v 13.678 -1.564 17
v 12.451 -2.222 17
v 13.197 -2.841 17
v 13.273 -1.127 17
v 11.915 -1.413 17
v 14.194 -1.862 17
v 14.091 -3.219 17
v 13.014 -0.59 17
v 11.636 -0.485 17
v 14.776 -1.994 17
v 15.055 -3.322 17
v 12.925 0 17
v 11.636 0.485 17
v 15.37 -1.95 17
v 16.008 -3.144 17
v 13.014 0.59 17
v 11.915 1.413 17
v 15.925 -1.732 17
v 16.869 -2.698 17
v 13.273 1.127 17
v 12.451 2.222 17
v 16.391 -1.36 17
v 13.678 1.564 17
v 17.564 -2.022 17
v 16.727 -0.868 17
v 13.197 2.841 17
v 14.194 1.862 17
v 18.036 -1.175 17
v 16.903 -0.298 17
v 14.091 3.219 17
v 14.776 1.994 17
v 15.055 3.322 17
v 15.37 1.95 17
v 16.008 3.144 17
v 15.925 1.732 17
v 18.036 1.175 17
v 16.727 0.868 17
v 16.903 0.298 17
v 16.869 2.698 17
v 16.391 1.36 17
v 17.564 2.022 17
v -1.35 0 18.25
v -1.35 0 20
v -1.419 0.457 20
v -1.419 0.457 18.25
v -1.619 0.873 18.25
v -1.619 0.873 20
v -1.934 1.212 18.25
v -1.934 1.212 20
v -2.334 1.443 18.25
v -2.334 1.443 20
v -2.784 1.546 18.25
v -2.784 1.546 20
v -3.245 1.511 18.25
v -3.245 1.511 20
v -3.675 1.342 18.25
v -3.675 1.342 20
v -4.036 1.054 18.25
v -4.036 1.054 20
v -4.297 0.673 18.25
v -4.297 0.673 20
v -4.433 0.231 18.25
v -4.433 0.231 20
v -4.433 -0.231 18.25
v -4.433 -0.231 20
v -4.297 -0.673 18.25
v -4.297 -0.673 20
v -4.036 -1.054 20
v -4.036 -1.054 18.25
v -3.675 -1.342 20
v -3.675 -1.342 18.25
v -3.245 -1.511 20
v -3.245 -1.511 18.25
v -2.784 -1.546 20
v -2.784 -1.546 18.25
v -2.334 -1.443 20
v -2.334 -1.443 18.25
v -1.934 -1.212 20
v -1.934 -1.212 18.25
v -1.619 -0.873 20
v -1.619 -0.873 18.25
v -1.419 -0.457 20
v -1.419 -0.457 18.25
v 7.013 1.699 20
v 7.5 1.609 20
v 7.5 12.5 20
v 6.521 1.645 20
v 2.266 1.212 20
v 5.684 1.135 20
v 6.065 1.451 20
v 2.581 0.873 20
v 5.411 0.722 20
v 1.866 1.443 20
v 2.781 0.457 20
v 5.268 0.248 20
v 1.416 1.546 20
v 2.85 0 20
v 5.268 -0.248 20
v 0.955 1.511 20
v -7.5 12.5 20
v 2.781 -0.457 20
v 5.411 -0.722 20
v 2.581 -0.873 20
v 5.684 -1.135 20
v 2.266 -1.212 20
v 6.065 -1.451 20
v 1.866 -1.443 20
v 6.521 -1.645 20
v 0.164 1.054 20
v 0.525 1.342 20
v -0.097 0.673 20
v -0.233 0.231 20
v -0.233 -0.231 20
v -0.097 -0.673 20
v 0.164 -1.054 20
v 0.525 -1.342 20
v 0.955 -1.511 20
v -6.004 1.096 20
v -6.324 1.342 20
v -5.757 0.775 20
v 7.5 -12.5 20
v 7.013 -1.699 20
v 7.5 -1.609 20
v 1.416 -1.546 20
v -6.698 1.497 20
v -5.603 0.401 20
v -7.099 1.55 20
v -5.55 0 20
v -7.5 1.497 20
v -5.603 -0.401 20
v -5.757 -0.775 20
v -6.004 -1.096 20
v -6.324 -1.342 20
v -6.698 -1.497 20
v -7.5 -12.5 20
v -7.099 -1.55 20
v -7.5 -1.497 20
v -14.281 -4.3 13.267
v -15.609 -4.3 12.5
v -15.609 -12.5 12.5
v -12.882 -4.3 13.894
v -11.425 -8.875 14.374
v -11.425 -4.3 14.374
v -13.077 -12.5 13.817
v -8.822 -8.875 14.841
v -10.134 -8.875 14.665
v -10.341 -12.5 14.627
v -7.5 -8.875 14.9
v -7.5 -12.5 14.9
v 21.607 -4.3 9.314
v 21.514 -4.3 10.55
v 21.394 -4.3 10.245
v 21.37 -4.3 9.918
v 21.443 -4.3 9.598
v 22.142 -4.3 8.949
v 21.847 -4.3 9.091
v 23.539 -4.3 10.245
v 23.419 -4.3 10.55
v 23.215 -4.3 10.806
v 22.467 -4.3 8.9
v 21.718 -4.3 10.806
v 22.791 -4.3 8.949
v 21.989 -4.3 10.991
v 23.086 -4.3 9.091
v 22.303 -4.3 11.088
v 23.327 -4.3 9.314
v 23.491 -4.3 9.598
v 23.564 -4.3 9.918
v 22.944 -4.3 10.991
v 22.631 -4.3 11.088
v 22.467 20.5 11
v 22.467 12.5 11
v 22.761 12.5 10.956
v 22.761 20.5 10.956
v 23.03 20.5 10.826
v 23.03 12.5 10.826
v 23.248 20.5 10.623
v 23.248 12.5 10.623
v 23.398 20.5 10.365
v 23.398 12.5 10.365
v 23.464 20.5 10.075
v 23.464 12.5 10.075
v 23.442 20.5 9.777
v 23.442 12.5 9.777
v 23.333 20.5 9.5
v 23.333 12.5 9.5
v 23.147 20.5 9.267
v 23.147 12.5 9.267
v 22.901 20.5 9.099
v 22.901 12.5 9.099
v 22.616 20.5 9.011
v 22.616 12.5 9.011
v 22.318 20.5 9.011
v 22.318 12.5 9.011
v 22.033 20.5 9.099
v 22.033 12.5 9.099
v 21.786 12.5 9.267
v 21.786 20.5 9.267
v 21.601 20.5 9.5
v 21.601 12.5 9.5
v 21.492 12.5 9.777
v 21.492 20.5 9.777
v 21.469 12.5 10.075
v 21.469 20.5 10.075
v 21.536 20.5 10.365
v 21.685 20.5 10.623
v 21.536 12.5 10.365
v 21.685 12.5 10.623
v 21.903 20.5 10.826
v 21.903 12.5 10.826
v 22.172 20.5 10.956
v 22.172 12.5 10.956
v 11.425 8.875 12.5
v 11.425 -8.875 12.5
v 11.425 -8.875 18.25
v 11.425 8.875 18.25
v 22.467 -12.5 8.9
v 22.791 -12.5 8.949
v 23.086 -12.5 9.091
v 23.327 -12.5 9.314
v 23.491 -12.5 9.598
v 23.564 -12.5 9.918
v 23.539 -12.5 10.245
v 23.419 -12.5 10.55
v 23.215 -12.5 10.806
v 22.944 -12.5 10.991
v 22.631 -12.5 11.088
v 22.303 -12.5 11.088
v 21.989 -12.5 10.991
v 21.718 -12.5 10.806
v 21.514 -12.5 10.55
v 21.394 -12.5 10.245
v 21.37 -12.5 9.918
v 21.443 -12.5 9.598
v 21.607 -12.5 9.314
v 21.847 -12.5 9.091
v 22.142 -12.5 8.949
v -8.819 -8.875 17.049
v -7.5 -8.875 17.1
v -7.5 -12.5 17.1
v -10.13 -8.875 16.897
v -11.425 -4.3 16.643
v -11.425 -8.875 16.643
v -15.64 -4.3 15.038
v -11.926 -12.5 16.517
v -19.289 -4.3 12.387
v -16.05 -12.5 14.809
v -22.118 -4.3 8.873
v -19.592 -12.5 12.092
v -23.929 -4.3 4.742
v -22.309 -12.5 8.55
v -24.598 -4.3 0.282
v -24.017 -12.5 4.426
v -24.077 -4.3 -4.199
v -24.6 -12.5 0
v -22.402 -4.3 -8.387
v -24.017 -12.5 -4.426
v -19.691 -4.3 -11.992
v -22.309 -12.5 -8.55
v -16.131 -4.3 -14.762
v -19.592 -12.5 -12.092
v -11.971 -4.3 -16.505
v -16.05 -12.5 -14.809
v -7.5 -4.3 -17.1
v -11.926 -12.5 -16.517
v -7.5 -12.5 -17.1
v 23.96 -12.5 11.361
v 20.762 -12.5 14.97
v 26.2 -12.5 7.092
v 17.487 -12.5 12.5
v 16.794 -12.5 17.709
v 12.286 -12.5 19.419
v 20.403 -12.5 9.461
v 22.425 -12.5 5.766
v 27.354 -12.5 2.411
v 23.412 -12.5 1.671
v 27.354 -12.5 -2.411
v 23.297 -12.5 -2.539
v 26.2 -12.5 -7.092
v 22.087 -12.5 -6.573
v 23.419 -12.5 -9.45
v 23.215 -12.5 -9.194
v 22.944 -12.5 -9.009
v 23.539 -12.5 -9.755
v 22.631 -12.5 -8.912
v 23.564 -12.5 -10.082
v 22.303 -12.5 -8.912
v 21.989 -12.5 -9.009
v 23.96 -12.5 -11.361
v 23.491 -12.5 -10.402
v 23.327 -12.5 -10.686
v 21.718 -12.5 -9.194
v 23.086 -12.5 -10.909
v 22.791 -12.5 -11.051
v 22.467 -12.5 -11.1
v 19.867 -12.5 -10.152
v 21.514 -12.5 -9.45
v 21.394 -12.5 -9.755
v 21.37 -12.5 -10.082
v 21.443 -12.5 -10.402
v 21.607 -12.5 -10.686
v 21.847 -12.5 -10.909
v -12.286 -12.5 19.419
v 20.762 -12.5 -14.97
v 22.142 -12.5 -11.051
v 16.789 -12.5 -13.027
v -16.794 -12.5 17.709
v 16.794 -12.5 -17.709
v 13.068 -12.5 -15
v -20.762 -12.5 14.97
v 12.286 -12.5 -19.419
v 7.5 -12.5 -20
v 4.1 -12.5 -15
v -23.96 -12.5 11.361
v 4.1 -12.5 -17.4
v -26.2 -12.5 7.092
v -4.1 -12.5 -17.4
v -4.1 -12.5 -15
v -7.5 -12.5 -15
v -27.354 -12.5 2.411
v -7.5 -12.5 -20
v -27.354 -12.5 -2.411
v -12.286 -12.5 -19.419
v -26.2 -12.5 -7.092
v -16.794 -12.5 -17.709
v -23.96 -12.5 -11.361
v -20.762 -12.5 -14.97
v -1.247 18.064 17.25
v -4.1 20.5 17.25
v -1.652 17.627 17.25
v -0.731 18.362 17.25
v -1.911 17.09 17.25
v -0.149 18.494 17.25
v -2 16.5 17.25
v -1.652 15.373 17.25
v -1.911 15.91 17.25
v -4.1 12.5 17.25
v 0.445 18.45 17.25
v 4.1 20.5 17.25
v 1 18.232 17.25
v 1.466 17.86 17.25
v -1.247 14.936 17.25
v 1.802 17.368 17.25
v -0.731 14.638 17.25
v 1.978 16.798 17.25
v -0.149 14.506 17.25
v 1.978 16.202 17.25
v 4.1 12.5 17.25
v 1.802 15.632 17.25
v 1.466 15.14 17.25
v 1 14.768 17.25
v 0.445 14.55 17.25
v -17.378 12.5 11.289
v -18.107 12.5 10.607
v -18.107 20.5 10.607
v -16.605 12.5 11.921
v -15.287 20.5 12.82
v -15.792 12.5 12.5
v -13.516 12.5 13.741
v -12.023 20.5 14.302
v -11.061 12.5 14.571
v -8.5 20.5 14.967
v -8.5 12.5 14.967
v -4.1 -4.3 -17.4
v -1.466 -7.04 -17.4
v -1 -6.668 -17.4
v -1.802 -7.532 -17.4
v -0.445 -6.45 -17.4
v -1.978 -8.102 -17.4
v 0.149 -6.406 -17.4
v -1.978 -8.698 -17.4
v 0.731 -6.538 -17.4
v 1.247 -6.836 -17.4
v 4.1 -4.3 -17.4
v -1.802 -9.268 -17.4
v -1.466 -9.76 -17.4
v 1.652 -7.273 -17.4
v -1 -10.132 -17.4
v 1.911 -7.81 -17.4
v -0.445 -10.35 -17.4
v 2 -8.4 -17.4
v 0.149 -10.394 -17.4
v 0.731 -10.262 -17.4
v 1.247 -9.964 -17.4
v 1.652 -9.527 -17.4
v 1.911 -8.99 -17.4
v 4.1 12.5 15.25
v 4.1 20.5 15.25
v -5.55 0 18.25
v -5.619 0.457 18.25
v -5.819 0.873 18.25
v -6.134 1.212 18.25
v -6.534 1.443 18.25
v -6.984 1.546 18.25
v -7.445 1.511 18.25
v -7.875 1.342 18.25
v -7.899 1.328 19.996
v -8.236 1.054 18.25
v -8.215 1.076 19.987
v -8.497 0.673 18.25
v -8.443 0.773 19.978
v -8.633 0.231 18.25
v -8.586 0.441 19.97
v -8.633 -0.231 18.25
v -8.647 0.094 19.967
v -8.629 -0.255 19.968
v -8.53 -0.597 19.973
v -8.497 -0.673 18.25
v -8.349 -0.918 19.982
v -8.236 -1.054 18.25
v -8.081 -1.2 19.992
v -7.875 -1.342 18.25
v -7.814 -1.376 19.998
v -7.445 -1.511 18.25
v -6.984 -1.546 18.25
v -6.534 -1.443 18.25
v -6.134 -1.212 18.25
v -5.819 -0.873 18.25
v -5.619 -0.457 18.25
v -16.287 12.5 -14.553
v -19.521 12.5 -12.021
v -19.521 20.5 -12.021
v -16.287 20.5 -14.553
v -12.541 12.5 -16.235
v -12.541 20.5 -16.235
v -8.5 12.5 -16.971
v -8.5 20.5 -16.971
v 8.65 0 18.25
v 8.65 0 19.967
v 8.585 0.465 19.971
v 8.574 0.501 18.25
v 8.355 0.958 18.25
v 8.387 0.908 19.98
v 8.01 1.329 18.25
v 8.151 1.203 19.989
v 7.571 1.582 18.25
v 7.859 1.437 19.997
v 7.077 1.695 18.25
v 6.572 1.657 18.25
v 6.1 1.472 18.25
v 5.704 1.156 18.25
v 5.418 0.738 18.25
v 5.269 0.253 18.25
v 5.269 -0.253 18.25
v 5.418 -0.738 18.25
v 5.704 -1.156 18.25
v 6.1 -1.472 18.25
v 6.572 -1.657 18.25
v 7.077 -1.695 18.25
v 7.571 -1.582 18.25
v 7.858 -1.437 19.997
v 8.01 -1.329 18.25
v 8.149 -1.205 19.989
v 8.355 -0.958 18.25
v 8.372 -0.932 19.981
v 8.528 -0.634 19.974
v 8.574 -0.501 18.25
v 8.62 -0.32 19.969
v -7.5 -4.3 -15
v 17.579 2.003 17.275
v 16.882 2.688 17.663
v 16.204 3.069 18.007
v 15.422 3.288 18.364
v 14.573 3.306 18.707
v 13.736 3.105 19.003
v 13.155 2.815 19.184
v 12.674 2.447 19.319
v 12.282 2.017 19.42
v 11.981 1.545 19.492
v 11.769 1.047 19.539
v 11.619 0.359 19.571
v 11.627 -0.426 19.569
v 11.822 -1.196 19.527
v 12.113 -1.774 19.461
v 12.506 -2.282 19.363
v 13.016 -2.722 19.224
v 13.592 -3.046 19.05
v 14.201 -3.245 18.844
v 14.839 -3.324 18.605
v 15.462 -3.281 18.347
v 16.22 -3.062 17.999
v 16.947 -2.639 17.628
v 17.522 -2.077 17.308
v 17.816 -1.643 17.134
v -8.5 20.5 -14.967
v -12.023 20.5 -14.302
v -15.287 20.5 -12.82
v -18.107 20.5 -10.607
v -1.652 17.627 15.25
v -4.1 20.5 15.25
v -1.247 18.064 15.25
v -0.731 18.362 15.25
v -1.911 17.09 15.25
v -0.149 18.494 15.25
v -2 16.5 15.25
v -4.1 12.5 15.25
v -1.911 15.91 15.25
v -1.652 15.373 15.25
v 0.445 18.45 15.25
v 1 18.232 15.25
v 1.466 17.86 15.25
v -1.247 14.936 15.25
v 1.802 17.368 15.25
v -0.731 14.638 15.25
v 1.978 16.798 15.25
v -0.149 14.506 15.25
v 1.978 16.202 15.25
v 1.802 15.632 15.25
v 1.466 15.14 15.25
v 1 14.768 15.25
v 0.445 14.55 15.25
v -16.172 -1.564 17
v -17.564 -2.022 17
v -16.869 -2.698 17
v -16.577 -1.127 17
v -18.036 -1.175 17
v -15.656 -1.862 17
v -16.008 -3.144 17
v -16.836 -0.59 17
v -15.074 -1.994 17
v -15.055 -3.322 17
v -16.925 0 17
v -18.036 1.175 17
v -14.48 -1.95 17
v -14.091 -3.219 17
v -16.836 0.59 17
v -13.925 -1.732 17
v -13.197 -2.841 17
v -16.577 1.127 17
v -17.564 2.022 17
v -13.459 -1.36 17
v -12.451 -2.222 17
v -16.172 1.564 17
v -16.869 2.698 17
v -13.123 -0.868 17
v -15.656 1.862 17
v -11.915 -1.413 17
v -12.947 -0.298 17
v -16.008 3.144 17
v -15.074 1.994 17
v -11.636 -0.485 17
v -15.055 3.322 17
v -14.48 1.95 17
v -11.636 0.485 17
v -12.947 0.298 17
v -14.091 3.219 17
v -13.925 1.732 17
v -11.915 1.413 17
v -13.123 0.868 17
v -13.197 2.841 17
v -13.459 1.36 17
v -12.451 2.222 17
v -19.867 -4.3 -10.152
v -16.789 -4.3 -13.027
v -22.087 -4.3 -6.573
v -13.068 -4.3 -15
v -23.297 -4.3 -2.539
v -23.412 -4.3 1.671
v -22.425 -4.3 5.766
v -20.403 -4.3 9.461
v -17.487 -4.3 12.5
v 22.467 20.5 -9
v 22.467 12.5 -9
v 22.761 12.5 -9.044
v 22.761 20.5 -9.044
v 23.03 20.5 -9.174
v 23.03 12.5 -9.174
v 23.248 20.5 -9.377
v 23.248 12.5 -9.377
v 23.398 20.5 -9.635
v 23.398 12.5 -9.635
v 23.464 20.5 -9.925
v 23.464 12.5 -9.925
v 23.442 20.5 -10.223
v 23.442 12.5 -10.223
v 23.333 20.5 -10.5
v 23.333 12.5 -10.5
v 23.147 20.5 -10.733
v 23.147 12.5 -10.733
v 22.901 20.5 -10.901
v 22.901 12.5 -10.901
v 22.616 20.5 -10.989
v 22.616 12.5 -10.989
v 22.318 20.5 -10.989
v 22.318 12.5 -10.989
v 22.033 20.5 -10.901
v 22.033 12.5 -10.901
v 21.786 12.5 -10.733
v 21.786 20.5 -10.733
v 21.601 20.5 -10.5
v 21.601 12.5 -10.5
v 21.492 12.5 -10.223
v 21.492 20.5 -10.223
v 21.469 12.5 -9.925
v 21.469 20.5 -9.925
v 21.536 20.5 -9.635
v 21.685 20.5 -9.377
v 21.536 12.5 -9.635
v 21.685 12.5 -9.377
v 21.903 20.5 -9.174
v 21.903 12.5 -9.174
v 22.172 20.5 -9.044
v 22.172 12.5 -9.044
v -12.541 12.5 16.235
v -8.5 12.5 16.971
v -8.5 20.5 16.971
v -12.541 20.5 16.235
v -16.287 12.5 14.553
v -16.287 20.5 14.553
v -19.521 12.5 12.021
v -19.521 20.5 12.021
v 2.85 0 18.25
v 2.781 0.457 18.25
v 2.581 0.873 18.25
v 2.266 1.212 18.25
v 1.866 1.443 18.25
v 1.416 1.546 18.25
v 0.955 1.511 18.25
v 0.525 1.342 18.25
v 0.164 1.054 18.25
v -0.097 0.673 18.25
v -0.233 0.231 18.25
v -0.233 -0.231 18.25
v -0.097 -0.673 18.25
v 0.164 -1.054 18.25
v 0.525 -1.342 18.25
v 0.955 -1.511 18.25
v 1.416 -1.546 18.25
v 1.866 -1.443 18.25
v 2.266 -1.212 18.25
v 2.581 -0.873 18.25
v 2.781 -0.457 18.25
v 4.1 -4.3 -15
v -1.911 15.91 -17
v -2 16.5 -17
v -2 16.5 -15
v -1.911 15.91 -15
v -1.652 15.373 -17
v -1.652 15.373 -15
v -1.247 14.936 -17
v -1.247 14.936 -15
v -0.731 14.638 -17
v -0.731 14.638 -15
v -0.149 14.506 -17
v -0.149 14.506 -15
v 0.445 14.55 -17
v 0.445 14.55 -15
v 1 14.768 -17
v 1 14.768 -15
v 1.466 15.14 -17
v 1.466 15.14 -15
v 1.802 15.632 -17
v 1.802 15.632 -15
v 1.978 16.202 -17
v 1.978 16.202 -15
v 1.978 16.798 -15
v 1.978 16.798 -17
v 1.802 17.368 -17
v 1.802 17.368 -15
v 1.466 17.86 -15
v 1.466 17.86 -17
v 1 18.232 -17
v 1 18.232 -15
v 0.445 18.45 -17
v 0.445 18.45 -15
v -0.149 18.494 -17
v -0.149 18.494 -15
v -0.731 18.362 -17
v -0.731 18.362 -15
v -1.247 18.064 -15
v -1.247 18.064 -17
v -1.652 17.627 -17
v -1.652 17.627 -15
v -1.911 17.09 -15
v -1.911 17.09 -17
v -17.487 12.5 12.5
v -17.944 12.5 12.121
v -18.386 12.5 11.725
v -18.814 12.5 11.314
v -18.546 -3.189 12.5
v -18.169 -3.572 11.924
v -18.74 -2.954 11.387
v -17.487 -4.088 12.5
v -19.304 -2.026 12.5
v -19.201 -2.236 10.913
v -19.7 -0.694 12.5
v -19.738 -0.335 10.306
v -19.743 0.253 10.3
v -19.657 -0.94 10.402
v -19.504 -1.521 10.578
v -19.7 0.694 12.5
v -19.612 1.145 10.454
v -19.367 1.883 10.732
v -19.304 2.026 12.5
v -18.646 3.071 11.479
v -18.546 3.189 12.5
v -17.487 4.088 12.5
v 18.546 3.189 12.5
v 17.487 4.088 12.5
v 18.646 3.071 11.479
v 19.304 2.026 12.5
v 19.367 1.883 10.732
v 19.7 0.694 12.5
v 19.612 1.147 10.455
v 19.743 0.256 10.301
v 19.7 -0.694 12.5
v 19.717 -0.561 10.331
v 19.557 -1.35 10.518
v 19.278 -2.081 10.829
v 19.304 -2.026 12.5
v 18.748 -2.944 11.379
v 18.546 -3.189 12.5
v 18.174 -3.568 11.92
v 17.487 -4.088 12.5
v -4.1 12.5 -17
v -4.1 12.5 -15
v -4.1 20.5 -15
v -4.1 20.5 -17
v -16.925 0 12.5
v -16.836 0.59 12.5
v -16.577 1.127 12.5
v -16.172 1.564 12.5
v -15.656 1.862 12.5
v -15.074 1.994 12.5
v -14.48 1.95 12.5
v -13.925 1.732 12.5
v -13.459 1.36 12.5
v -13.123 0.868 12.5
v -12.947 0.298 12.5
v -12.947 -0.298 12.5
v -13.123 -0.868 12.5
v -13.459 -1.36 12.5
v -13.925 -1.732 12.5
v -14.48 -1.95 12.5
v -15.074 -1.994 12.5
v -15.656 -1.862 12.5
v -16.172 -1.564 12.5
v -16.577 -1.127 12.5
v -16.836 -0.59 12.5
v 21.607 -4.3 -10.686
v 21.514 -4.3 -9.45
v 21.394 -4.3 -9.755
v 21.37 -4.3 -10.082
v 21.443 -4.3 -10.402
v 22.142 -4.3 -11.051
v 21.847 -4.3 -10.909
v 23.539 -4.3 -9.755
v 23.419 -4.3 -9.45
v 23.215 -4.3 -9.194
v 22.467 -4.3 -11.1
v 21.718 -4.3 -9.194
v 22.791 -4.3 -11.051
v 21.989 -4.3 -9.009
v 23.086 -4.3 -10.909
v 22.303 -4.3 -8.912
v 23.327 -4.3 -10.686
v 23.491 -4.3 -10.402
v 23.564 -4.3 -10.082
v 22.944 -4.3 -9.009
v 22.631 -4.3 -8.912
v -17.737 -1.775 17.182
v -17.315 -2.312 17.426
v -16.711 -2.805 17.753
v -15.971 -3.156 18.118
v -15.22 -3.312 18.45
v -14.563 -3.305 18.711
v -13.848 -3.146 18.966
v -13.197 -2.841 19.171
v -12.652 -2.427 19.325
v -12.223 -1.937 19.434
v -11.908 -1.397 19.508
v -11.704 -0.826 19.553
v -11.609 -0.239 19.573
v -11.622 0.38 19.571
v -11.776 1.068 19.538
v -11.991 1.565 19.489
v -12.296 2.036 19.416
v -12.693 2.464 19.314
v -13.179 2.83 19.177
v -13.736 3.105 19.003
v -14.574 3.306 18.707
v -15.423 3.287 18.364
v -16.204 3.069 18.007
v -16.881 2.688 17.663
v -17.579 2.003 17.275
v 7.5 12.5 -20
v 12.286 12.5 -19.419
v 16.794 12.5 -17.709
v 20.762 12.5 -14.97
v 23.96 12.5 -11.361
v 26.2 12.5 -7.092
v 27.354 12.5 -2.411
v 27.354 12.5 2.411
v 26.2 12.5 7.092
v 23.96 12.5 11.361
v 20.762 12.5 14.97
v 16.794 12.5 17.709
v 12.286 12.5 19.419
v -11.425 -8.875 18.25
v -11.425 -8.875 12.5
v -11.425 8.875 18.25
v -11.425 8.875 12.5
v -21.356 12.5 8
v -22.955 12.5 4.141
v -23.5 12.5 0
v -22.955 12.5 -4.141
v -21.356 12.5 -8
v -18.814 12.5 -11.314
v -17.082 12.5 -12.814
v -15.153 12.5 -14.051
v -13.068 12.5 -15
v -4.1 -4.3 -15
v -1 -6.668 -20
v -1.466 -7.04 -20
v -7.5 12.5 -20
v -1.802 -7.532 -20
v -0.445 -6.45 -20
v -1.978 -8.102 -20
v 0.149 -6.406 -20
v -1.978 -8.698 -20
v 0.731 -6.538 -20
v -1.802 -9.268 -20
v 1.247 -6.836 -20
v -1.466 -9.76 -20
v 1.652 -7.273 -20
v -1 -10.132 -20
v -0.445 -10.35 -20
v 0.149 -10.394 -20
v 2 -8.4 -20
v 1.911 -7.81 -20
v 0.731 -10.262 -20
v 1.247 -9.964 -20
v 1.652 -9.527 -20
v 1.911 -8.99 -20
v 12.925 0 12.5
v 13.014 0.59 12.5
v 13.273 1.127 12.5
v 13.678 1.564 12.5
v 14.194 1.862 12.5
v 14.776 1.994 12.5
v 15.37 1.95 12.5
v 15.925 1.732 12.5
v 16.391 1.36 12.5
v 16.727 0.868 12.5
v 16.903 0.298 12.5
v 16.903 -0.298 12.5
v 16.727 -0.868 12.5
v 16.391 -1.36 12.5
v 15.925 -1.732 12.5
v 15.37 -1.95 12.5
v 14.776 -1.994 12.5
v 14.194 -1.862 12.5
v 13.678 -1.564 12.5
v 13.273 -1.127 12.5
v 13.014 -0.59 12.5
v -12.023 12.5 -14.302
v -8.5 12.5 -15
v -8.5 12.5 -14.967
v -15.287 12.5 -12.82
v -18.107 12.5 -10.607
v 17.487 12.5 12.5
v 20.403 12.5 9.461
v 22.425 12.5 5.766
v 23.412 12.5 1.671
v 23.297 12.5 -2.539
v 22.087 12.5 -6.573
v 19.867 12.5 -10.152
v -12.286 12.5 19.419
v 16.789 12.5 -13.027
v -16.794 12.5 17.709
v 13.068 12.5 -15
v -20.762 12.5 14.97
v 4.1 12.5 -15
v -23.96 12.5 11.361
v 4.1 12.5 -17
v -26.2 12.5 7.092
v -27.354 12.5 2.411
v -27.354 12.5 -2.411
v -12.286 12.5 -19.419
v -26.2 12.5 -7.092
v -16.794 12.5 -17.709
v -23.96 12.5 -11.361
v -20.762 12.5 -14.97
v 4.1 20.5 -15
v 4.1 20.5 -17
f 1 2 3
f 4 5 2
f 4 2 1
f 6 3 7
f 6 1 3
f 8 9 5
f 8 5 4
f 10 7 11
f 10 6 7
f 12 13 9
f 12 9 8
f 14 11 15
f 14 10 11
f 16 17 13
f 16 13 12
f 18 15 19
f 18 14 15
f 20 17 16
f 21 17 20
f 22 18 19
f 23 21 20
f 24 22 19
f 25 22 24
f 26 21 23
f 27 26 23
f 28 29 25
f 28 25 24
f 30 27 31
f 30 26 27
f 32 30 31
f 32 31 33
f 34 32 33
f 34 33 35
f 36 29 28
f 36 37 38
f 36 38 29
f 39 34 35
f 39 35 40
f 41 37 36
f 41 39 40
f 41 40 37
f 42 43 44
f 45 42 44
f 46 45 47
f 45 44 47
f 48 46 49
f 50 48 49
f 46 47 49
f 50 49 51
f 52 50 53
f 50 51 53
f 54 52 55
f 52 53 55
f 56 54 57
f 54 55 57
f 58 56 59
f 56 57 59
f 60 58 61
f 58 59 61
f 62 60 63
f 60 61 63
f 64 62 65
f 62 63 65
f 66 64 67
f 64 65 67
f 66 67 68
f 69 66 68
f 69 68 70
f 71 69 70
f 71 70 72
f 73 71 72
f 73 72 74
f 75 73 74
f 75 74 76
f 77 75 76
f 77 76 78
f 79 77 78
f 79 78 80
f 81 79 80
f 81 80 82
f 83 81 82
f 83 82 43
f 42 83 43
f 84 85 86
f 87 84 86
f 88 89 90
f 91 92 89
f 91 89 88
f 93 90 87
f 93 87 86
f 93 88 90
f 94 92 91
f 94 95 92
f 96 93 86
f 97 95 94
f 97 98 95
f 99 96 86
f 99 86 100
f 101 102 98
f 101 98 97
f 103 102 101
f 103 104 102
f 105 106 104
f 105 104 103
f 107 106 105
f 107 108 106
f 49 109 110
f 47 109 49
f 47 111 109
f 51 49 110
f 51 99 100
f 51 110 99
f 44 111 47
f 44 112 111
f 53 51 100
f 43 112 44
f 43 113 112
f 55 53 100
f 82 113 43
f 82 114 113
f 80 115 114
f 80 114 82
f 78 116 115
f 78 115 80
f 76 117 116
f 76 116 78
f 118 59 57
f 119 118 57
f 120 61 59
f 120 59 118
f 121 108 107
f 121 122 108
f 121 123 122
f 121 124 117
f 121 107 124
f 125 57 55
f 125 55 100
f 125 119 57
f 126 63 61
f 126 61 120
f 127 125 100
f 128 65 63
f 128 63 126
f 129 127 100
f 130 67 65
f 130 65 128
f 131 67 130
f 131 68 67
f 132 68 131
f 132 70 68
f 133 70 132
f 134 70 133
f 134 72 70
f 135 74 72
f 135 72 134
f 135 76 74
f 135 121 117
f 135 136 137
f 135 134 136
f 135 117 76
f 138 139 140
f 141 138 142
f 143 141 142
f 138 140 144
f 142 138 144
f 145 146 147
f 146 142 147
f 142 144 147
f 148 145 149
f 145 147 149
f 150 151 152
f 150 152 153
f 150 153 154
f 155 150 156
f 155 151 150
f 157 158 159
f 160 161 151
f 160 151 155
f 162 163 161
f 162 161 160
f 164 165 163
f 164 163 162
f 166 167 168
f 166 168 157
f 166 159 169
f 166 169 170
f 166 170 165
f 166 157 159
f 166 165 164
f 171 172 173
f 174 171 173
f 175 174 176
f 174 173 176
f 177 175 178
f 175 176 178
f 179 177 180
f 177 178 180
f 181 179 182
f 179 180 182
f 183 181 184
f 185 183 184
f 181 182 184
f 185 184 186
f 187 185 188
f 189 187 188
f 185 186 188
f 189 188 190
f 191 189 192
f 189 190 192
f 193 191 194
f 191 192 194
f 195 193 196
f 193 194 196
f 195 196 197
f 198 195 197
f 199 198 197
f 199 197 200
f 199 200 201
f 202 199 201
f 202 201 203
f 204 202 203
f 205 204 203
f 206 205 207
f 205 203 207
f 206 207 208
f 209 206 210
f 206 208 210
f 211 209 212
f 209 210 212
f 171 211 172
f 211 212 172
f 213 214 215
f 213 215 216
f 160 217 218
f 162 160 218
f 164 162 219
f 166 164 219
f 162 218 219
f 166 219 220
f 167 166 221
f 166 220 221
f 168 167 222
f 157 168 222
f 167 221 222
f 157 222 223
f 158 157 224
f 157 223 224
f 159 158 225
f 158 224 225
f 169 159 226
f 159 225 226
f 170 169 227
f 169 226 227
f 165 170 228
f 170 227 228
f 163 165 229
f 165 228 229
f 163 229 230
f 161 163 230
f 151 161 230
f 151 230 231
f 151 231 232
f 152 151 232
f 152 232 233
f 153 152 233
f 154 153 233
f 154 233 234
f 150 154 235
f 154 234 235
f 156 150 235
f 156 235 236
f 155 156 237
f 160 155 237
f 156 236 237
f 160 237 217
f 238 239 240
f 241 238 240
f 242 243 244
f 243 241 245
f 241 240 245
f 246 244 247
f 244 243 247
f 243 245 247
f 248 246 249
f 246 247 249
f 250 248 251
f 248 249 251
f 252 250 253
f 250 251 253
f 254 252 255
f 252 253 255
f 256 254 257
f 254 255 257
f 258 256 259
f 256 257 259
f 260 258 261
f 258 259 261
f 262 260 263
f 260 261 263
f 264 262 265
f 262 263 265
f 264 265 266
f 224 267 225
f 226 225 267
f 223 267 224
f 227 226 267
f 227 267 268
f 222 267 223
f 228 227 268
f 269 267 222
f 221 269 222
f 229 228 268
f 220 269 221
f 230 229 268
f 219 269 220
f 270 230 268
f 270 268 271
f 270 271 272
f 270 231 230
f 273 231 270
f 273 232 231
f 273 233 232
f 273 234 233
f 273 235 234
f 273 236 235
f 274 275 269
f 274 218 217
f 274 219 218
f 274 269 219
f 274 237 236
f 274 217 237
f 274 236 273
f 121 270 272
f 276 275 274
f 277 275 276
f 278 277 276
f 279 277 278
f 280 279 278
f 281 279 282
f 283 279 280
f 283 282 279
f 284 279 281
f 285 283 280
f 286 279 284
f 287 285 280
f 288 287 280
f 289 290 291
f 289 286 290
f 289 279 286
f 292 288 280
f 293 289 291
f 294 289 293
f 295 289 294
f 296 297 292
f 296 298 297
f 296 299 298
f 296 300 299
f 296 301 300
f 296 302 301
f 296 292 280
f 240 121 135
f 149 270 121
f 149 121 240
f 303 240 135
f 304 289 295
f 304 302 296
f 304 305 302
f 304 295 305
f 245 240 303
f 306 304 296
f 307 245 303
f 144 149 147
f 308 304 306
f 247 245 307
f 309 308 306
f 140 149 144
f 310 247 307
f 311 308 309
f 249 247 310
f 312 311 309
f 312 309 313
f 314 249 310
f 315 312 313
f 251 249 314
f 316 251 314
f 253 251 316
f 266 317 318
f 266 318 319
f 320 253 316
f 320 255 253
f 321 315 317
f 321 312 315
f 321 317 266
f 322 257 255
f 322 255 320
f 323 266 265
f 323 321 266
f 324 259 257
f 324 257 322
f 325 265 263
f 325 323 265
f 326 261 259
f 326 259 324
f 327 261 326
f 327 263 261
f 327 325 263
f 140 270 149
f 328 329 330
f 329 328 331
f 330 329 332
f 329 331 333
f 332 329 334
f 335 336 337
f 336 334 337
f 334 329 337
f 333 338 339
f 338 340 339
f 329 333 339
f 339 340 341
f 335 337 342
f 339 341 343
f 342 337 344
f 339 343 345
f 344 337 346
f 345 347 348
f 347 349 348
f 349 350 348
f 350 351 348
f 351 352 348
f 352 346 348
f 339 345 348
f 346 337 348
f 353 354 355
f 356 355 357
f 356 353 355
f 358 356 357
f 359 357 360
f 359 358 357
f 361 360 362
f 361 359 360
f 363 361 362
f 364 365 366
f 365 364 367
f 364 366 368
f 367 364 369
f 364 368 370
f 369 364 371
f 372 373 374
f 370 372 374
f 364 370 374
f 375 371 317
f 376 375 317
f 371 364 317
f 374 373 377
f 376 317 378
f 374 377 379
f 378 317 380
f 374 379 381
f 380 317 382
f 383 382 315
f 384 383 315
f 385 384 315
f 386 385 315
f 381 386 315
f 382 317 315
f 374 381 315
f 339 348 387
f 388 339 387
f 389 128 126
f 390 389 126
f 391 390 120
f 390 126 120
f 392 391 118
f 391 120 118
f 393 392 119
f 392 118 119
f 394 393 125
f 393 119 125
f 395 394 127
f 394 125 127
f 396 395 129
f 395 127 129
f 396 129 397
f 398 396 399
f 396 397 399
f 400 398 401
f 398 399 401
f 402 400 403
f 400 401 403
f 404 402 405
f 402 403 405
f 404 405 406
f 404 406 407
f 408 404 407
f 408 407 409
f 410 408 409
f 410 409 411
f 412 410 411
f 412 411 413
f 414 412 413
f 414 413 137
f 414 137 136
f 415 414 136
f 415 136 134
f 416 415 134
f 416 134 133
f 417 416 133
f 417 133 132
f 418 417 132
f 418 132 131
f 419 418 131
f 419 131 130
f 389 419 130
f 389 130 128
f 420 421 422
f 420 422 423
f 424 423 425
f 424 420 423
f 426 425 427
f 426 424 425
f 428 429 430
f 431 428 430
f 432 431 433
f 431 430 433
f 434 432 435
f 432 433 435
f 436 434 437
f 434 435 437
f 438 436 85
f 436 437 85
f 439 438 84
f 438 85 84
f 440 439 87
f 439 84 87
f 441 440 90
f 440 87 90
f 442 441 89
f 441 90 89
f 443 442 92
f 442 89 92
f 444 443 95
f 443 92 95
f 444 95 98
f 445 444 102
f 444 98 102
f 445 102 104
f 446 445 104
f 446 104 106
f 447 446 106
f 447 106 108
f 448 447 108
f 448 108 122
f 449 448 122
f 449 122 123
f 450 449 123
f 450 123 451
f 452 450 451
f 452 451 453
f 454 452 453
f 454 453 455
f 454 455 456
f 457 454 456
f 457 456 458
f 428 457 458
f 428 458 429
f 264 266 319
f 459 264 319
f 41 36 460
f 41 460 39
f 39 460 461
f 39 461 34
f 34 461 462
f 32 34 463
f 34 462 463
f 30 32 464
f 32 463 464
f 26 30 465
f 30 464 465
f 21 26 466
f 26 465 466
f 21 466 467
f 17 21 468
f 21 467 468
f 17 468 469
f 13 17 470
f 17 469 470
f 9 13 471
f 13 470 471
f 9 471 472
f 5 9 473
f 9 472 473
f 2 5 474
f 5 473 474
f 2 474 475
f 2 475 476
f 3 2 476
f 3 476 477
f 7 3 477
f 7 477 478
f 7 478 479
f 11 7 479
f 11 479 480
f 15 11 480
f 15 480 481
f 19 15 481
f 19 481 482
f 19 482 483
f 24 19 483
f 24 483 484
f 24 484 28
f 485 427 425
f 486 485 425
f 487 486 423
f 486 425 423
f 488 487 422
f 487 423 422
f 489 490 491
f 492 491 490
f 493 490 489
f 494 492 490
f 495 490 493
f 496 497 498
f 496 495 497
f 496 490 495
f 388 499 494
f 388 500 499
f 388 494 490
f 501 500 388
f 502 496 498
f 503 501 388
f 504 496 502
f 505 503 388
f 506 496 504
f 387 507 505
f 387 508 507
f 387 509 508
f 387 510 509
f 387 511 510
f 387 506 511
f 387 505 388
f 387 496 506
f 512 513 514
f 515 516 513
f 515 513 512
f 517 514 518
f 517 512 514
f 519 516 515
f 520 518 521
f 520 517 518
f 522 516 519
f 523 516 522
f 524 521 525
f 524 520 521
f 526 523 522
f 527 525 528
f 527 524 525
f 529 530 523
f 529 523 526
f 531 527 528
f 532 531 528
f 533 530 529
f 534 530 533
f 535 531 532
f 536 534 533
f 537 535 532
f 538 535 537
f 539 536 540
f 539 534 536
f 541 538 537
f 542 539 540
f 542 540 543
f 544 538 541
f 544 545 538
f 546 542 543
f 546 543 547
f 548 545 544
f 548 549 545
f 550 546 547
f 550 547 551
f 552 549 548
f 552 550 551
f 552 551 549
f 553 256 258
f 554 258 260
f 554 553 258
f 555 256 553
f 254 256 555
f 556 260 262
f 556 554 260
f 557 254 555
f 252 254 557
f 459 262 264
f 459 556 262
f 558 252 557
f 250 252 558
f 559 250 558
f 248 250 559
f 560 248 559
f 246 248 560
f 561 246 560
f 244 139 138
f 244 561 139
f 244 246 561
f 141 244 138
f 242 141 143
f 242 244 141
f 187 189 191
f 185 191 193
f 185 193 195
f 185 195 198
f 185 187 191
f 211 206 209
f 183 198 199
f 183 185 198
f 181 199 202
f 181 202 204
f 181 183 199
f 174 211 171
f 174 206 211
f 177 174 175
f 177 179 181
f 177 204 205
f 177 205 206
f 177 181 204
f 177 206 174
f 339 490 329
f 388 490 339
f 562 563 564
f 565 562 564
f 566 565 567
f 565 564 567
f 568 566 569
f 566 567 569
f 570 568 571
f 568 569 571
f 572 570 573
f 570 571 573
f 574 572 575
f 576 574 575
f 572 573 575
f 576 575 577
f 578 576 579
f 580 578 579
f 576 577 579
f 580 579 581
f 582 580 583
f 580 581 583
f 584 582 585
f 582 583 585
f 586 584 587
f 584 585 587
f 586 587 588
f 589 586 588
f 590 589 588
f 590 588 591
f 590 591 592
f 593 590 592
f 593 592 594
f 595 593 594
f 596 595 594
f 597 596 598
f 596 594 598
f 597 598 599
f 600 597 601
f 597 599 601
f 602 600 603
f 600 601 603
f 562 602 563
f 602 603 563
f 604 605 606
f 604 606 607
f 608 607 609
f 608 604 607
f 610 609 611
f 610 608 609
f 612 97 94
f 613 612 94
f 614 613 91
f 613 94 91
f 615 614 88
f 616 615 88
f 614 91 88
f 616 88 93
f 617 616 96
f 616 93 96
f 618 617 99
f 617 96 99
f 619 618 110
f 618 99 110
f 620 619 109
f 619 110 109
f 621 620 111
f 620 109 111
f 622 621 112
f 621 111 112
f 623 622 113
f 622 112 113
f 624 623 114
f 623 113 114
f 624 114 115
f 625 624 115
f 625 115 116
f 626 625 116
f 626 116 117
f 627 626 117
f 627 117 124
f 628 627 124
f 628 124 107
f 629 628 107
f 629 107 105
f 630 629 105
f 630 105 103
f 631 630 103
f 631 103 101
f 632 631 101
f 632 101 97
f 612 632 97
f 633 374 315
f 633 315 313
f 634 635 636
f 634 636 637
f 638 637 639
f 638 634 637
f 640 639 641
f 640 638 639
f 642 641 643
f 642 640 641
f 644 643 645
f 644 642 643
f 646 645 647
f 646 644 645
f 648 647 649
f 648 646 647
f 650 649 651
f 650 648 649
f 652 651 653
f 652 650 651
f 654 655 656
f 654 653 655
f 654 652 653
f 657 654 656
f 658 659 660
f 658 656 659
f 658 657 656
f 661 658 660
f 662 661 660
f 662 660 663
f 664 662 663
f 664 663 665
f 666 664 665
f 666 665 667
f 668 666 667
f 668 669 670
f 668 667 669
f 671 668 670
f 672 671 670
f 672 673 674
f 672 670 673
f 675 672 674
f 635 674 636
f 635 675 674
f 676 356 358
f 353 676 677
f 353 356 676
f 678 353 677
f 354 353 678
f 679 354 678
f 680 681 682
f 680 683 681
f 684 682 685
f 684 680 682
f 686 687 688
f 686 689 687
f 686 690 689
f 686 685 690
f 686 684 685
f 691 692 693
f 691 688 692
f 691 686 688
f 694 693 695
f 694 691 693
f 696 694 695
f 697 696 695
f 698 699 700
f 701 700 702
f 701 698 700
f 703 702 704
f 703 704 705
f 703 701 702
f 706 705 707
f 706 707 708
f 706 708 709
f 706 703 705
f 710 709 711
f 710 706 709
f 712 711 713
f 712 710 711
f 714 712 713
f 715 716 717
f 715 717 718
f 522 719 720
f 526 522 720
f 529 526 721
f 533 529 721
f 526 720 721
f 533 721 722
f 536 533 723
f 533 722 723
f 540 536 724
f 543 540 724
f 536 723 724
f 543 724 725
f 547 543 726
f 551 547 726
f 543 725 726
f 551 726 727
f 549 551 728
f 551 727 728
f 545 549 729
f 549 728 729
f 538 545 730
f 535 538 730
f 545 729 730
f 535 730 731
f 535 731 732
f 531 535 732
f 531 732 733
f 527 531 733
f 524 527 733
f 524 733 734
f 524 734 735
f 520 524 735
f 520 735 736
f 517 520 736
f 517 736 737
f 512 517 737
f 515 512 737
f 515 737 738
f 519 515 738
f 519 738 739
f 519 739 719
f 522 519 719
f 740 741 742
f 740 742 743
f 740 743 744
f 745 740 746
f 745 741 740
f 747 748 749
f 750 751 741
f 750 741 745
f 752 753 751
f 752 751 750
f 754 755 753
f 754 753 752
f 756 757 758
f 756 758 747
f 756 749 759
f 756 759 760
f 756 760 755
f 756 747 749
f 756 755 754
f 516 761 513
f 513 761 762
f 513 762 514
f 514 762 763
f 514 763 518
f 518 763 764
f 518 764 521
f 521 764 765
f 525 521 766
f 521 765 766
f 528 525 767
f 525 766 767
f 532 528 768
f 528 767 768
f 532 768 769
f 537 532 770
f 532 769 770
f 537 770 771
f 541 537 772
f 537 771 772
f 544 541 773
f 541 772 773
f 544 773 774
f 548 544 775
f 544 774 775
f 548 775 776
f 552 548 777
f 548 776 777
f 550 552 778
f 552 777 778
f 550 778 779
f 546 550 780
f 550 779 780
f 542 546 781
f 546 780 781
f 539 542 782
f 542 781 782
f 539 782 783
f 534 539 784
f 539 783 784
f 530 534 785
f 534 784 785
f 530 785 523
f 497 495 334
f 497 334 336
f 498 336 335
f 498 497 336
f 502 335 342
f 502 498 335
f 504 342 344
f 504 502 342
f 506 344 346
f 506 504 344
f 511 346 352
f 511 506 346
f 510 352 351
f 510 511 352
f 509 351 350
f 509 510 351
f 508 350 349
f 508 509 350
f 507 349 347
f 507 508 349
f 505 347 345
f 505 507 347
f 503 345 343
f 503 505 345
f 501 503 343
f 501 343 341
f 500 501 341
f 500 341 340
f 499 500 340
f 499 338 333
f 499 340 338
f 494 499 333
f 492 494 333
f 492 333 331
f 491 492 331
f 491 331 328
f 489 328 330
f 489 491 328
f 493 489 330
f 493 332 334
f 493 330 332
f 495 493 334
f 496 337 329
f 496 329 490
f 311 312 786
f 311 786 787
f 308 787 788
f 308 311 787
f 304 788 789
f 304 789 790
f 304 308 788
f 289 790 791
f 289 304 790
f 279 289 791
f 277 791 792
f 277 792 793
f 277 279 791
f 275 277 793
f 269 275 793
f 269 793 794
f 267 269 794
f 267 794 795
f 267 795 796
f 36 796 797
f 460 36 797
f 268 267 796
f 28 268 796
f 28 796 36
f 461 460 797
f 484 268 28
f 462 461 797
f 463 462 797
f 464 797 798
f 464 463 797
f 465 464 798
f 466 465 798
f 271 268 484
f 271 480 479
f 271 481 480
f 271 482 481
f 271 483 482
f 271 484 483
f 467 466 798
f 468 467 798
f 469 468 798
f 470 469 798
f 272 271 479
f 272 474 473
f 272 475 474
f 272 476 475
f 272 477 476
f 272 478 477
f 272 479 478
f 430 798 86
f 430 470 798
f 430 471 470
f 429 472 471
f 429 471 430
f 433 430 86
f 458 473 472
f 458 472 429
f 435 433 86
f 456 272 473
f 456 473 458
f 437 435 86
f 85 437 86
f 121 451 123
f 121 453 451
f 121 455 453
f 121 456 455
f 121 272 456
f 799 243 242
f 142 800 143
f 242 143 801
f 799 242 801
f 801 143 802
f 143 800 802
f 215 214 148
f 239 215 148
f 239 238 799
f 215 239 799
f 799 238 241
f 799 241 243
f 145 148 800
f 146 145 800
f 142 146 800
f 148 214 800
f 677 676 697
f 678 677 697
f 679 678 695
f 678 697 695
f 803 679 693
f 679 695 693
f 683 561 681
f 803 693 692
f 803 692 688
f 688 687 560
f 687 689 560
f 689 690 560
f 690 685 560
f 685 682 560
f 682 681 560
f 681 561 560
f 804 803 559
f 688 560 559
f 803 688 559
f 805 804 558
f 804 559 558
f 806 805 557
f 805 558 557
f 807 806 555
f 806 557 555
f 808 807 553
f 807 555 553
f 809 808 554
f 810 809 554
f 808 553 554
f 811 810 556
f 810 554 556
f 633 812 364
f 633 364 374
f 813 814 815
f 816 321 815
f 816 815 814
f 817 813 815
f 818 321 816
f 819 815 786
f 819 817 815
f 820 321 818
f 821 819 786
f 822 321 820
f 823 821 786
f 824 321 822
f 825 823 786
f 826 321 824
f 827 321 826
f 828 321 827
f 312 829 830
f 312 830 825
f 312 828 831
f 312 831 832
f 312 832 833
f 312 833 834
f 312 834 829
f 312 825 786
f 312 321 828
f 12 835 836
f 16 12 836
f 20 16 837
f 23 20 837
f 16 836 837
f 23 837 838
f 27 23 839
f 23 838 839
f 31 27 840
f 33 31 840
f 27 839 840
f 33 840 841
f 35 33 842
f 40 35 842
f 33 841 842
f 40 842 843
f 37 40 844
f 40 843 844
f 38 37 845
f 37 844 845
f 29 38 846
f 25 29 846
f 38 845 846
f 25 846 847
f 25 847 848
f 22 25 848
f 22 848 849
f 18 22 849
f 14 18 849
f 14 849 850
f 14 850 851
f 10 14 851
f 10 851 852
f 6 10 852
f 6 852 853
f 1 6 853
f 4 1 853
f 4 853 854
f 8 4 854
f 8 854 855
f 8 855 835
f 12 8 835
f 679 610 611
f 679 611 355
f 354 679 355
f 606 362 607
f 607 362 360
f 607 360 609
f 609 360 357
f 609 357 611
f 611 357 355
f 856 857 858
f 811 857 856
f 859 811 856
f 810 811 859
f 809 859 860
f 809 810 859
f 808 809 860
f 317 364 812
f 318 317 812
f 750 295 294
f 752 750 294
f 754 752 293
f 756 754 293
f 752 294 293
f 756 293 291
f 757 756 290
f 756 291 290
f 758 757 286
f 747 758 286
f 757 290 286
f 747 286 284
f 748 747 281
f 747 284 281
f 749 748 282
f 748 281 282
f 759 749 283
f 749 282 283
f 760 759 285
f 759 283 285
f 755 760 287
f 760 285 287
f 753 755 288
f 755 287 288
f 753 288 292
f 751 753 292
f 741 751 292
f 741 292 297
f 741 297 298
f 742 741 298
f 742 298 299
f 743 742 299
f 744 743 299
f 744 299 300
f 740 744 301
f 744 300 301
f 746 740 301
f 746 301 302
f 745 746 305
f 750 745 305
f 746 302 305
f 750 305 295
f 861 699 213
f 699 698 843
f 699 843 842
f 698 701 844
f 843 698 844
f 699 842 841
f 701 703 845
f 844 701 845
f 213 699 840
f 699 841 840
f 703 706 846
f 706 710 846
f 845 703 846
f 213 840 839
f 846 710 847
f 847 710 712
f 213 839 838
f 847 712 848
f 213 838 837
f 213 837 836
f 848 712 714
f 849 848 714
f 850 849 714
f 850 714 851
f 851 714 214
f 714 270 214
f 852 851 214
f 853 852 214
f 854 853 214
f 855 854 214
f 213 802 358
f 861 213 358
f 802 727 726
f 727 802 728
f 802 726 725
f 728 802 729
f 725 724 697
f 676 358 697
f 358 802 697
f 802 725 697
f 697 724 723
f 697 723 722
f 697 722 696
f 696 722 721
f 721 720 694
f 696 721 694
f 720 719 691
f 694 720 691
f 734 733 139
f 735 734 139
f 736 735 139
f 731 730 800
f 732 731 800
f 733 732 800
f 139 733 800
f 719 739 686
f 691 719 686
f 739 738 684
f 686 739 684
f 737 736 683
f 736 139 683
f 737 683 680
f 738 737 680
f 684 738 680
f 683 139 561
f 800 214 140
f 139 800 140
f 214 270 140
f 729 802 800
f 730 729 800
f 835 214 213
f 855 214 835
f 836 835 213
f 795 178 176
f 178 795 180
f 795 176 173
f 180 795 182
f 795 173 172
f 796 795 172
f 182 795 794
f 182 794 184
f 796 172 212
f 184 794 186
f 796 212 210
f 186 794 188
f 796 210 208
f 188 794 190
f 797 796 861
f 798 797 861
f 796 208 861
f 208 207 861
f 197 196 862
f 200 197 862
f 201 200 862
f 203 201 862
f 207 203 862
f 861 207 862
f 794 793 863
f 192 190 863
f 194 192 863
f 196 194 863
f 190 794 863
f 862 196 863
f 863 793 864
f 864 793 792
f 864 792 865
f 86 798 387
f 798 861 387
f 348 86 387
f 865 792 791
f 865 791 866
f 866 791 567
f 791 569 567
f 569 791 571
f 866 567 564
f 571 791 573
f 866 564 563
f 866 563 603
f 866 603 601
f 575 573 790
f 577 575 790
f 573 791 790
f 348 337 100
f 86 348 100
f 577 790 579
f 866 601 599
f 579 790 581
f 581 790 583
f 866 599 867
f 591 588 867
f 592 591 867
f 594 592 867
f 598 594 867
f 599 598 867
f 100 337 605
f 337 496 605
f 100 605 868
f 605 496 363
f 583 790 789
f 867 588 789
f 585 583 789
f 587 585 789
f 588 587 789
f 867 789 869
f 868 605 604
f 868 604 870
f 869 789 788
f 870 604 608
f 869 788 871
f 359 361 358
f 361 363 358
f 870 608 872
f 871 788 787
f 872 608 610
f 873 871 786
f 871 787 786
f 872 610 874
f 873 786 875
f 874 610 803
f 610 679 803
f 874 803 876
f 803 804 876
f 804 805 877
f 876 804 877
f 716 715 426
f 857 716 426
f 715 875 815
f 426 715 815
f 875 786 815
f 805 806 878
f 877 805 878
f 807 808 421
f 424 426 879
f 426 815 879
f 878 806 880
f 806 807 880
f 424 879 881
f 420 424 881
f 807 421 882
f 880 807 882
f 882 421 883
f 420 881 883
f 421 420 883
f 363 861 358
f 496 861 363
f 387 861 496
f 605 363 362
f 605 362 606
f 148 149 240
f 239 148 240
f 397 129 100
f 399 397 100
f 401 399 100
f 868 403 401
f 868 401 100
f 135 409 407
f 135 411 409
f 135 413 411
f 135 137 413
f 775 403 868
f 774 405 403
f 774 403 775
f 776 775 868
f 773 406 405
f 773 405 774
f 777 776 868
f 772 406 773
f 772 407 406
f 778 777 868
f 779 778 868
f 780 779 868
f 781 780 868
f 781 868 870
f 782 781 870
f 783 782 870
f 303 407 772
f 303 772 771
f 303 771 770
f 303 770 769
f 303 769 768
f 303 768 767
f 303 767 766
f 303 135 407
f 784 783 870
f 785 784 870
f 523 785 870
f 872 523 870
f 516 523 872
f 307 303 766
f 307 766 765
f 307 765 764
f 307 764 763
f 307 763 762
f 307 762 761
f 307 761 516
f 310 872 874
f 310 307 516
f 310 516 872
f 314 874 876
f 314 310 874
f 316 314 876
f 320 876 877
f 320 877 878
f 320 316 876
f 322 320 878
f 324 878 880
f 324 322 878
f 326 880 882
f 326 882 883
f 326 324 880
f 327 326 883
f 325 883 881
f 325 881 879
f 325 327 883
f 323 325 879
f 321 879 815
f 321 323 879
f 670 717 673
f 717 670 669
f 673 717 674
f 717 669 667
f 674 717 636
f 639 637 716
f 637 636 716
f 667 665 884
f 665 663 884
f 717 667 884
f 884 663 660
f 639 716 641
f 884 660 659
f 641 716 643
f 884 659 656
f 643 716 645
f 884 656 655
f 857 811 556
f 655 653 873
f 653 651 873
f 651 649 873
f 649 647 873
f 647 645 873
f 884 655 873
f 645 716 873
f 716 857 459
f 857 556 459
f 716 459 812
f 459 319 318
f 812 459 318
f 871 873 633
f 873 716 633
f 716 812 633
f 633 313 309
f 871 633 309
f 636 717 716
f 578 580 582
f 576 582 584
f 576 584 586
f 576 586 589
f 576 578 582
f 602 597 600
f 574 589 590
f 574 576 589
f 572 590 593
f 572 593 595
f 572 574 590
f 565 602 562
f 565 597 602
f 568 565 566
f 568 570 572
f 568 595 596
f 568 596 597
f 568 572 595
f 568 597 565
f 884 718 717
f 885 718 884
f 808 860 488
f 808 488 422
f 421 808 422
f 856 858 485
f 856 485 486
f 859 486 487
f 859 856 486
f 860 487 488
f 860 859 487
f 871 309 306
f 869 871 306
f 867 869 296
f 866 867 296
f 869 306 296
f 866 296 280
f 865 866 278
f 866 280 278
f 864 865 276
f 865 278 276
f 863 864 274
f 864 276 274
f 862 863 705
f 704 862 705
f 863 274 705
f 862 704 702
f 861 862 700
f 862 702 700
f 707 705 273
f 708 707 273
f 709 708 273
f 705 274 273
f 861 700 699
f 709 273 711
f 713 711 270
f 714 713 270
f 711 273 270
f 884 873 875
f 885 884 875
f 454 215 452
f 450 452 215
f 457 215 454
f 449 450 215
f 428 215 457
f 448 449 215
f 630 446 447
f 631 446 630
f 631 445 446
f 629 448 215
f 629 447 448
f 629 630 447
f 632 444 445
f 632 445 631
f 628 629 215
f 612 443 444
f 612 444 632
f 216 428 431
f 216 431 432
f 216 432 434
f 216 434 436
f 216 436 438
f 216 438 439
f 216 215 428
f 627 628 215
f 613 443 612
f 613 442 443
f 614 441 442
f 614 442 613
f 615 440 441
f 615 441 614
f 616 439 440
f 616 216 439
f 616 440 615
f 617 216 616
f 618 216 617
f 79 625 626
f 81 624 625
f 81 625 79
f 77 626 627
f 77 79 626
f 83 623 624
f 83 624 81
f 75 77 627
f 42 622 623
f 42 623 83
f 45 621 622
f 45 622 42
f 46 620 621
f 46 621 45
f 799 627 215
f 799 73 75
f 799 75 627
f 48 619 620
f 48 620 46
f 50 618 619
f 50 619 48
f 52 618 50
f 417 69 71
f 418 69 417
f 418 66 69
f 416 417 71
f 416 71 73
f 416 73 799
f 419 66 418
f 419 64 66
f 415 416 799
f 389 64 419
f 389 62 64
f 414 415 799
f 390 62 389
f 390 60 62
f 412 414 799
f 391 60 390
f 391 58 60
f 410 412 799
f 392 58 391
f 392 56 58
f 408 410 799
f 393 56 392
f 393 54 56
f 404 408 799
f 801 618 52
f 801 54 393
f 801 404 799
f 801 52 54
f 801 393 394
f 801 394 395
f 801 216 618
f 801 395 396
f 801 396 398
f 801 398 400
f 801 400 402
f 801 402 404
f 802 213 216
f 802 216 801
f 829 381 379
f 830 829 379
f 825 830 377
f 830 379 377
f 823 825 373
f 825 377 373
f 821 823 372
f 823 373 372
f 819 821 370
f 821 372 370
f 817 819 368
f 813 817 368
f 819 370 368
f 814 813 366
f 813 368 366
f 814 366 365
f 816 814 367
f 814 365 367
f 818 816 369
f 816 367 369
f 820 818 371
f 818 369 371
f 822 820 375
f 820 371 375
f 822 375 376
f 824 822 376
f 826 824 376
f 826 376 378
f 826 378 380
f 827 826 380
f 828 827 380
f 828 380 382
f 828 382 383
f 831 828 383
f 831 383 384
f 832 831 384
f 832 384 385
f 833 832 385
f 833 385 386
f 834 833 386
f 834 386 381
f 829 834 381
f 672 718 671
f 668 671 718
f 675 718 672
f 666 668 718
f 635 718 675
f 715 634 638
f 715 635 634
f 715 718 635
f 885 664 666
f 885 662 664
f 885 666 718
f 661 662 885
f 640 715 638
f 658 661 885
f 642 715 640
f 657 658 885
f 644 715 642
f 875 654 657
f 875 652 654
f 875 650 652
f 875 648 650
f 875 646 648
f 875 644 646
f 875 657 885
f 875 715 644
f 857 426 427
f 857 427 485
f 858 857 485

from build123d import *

# Parameters (mm, degrees)
BOSS_EXTRUDE1_DEPTH      = 12.5
BOSS_EXTRUDE1_DEPTH_BACK = 12.5
SKETCH3_R                = 1.55
SKETCH3_R_2              = 1.7
CUT_EXTRUDE1_DEPTH       = 7.5
SKETCH4_W                = 22.85
SKETCH4_H                = 17.75
CUT_EXTRUDE2_DEPTH       = 5.75
SKETCH5_R                = 2
CUT_EXTRUDE3_DEPTH       = 5.75
SKETCH6_R                = 3.325
CUT_EXTRUDE4_DEPTH       = 3
SKETCH7_R                = 4.825
CUT_EXTRUDE5_DEPTH       = 3
SKETCH9_R                = 1.1
SKETCH9_W                = 8.2
SKETCH9_H                = 2.4
CUT_EXTRUDE6_DEPTH       = 8.2
SKETCH10_R               = 2
CUT_EXTRUDE7_DEPTH       = 8.2
SKETCH11_R               = 1
SKETCH11_W               = 8.2
SKETCH11_H               = 2
BOSS_EXTRUDE2_DEPTH      = 8
CUT_EXTRUDE8_DEPTH       = 23
CUT_EXTRUDE8_DEPTH_BACK  = 24
SKETCH13_R               = 2


with BuildPart() as part:
    # Sketch1 → Boss-Extrude1 (new, two sides: drawn at the far end of the back side and taken through both)
    with BuildSketch(Plane(origin=(0, 0, 0), x_dir=(1, 0, 0), z_dir=(0, 1, 0)).offset(-BOSS_EXTRUDE1_DEPTH_BACK)):
        with BuildLine():
            Line((7.5, -20), (-7.5, -20))
            ThreePointArc((-7.5, -20), (-27.5, 0), (-7.5, 20))
            Line((-7.5, 20), (7.5, 20))
            ThreePointArc((7.5, 20), (27.5, 0), (7.5, -20))
        make_face()
        with BuildLine():
            Line((-13.067764363, 15), (13.067764363, 15))
            ThreePointArc((13.067764363, 15), (23.297278294, 2.538897101), (17.487492178, -12.5))
            Line((17.487492178, -12.5), (-17.487492178, -12.5))
            ThreePointArc((-17.487492178, -12.5), (-23.297278294, 2.538897101), (-13.067764363, 15))
        make_face(mode=Mode.SUBTRACT)
    extrude(amount=BOSS_EXTRUDE1_DEPTH + BOSS_EXTRUDE1_DEPTH_BACK)

    # Sketch3 → Cut-Extrude1 (cut)
    with BuildSketch(Plane.XY.offset(20)):
        with Locations((-7.1, 0)):
            Circle(SKETCH3_R)
        with Locations((-2.9, 0)):
            Circle(SKETCH3_R)
        with Locations((1.3, 0)):
            Circle(SKETCH3_R)
        with Locations((6.95, 0)):
            Circle(SKETCH3_R_2)
    extrude(amount=-CUT_EXTRUDE1_DEPTH, mode=Mode.SUBTRACT)

    # Sketch4 → Cut-Extrude2 (cut)
    with BuildSketch(Plane(origin=(0, 0, 12.5), x_dir=(-1, 0, 0), z_dir=(0, 0, -1))):
        Rectangle(SKETCH4_W, SKETCH4_H)
    extrude(amount=-CUT_EXTRUDE2_DEPTH, mode=Mode.SUBTRACT)

    # Sketch5 → Cut-Extrude3 (cut)
    with BuildSketch(Plane(origin=(0, 0, 12.5), x_dir=(-1, 0, 0), z_dir=(0, 0, -1))):
        with Locations((14.925, 0)):
            Circle(SKETCH5_R)
        with Locations((-14.925, 0)):
            Circle(SKETCH5_R)
    extrude(amount=-CUT_EXTRUDE3_DEPTH, mode=Mode.SUBTRACT)

    # Sketch6 → Cut-Extrude4 (cut)
    with BuildSketch(Plane.XY.offset(20)):
        with Locations((-14.925, 0)):
            Circle(SKETCH6_R)
        with Locations((14.925, 0)):
            Circle(SKETCH6_R)
    extrude(amount=-CUT_EXTRUDE4_DEPTH, mode=Mode.SUBTRACT)

    # Sketch7 → Cut-Extrude5 (cut)
    with BuildSketch(Plane(origin=(0, 0, 12.5), x_dir=(-1, 0, 0), z_dir=(0, 0, -1))):
        with Locations((14.925, 0)):
            Circle(SKETCH7_R)
        with Locations((-14.925, 0)):
            Circle(SKETCH7_R)
    extrude(amount=CUT_EXTRUDE5_DEPTH, mode=Mode.SUBTRACT)

    # Sketch9 → Cut-Extrude6 (cut)
    with BuildSketch(Plane.XZ.offset(12.5)):
        with Locations((22.466629547, 10)):
            Circle(SKETCH9_R)
        with Locations((22.466629547, -10)):
            Circle(SKETCH9_R)
        with Locations((0, -16.2)):
            Rectangle(SKETCH9_W, SKETCH9_H)
        with BuildLine():
            Line((-7.5, 14.9), (-7.5, 17.1))
            ThreePointArc((-7.5, 17.1), (-24.6, 0), (-7.5, -17.1))
            Line((-7.5, -17.1), (-7.5, -14.9))
            ThreePointArc((-7.5, -14.9), (-22.4, 0), (-7.5, 14.9))
        make_face()
    extrude(amount=-CUT_EXTRUDE6_DEPTH, mode=Mode.SUBTRACT)

    # Sketch10 → Cut-Extrude7 (cut)
    with BuildSketch(Plane.XY.offset(-17.4)):
        with Locations((0, -8.4)):
            Circle(SKETCH10_R)
    extrude(amount=-CUT_EXTRUDE7_DEPTH, mode=Mode.SUBTRACT)

    # Sketch11 → Boss-Extrude2 (add)
    with BuildSketch(Plane(origin=(0, 12.5, 0), x_dir=(1, 0, 0), z_dir=(0, 1, 0))):
        with Locations((22.466629547, -10)):
            Circle(SKETCH11_R)
        with Locations((22.466629547, 10)):
            Circle(SKETCH11_R)
        with BuildLine():
            Line((-8.5, -14.966629547), (-8.5, -16.970562748))
            ThreePointArc((-8.5, -16.970562748), (-14.464941324, -15.50772686), (-19.52081528, -12.02081528))
            Line((-19.52081528, -12.02081528), (-18.106601718, -10.606601718))
            ThreePointArc((-18.106601718, -10.606601718), (-13.699254917, -13.659035049), (-8.5, -14.966629547))
        make_face()
        with BuildLine():
            Line((-18.106601718, 10.606601718), (-19.52081528, 12.02081528))
            ThreePointArc((-19.52081528, 12.02081528), (-14.464941324, 15.50772686), (-8.5, 16.970562748))
            Line((-8.5, 16.970562748), (-8.5, 14.966629547))
            ThreePointArc((-8.5, 14.966629547), (-13.699254917, 13.659035049), (-18.106601718, 10.606601718))
        make_face()
        with Locations((0, 16)):
            Rectangle(SKETCH11_W, SKETCH11_H)
        with Locations((0, -16.25)):
            Rectangle(SKETCH11_W, SKETCH11_H)
    extrude(amount=BOSS_EXTRUDE2_DEPTH)

    # Sketch13 → Cut-Extrude8 (cut, two sides: drawn at the far end of the back side and taken through both)
    with BuildSketch(Plane.XY.offset(-CUT_EXTRUDE8_DEPTH_BACK)):
        with Locations((0, 16.5)):
            Circle(SKETCH13_R)
    extrude(amount=CUT_EXTRUDE8_DEPTH + CUT_EXTRUDE8_DEPTH_BACK, mode=Mode.SUBTRACT)


solid = part.part
